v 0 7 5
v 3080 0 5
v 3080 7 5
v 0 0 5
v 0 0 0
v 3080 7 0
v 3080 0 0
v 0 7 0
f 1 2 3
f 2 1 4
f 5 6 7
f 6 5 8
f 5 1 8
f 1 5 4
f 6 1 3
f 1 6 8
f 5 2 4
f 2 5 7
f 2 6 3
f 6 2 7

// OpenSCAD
translate([5.5, 3.5, 2.5]) color([0.6210768456186673, 0.7156193503014563, 0.38801723531250565]) cube([11, 7, 5], center=true);
translate([16.5, 3.5, 2.5]) color([0.4144179882772473, 0.650832862263345, 0.001524221856720187]) cube([11, 7, 5], center=true);
translate([27.5, 3.5, 2.5]) color([0.1923095412446758, 0.3344016906625016, 0.23941596018595857]) cube([11, 7, 5], center=true);
translate([38.5, 3.5, 2.5]) color([0.6373994011293003, 0.37864807032309444, 0.8754233917130172]) cube([11, 7, 5], center=true);
translate([49.5, 3.5, 2.5]) color([0.5681514209101919, 0.4144063966836443, 0.40226707511907955]) cube([11, 7, 5], center=true);
translate([60.5, 3.5, 2.5]) color([0.7018296239336754, 0.41822655329246605, 0.6621958889738174]) cube([11, 7, 5], center=true);
translate([71.5, 3.5, 2.5]) color([0.04677968595679827, 0.44535218971882984, 0.25922692344722276]) cube([11, 7, 5], center=true);
translate([82.5, 3.5, 2.5]) color([0.15768657212231085, 0.5275731301676146, 0.48726560106903205]) cube([11, 7, 5], center=true);
translate([93.5, 3.5, 2.5]) color([0.5614049256144269, 0.7554847672586825, 0.8838751542487009]) cube([11, 7, 5], center=true);
translate([104.5, 3.5, 2.5]) color([0.4945826703752868, 0.31205824641687296, 0.46689223535252355]) cube([11, 7, 5], center=true);
translate([115.5, 3.5, 2.5]) color([0.8090458573603624, 0.8750163314802711, 0.8124149323637591]) cube([11, 7, 5], center=true);
translate([126.5, 3.5, 2.5]) color([0.188001294050828, 0.9994203594553304, 0.6330887599183004]) cube([11, 7, 5], center=true);
translate([137.5, 3.5, 2.5]) color([0.08346705017572931, 0.7255543554613124, 0.9868214802051282]) cube([11, 7, 5], center=true);
translate([148.5, 3.5, 2.5]) color([0.40181682221254356, 0.6785150052419683, 0.31617713722134233]) cube([11, 7, 5], center=true);
translate([159.5, 3.5, 2.5]) color([0.2135246620646961, 0.7173241433110372, 0.0023575647193538884]) cube([11, 7, 5], center=true);
translate([170.5, 3.5, 2.5]) color([0.8227314105314157, 0.5283459768597928, 0.09778434180065931]) cube([11, 7, 5], center=true);
translate([181.5, 3.5, 2.5]) color([0.11890389478474583, 0.6492654248961536, 0.8736538239003423]) cube([11, 7, 5], center=true);
translate([192.5, 3.5, 2.5]) color([0.27998274332687256, 0.9785151867733981, 0.10018068906370903]) cube([11, 7, 5], center=true);
translate([203.5, 3.5, 2.5]) color([0.8539381095973382, 0.39669617733090445, 0.08134541676823415]) cube([11, 7, 5], center=true);
translate([214.5, 3.5, 2.5]) color([0.2747138434192621, 0.4529781848179143, 0.7923415311856522]) cube([11, 7, 5], center=true);
translate([225.5, 3.5, 2.5]) color([0.8613599036372361, 0.13342055420254906, 0.5208655284141989]) cube([11, 7, 5], center=true);
translate([236.5, 3.5, 2.5]) color([0.6507832381497373, 0.3470530145996015, 0.8718638357105861]) cube([11, 7, 5], center=true);
translate([247.5, 3.5, 2.5]) color([0.27840981521636055, 0.01857432754559518, 0.0406632736752609]) cube([11, 7, 5], center=true);
translate([258.5, 3.5, 2.5]) color([0.6809967701112433, 0.5583557360970469, 0.946502554169996]) cube([11, 7, 5], center=true);
translate([269.5, 3.5, 2.5]) color([0.9384387997349186, 0.9098511774051025, 0.04200453196734122]) cube([11, 7, 5], center=true);
translate([280.5, 3.5, 2.5]) color([0.7491348233908631, 0.7013248175948597, 0.6553618646747296]) cube([11, 7, 5], center=true);
translate([291.5, 3.5, 2.5]) color([0.7123576525162417, 0.9027101506193307, 0.6401411997932241]) cube([11, 7, 5], center=true);
translate([302.5, 3.5, 2.5]) color([0.372449262972256, 0.5379287837318205, 0.20784410369082473]) cube([11, 7, 5], center=true);
translate([313.5, 3.5, 2.5]) color([0.5871255046951435, 0.008897082049078797, 0.15102317386398778]) cube([11, 7, 5], center=true);
translate([324.5, 3.5, 2.5]) color([0.3334083880298664, 0.7896231589257826, 0.7184994227715396]) cube([11, 7, 5], center=true);
translate([335.5, 3.5, 2.5]) color([0.3382559700266786, 0.6205381083165517, 0.041202949506209285]) cube([11, 7, 5], center=true);
translate([346.5, 3.5, 2.5]) color([0.16386054567557595, 0.9819140701253054, 0.28953085363586695]) cube([11, 7, 5], center=true);
translate([357.5, 3.5, 2.5]) color([0.39479198298829066, 0.5484842965725134, 0.29340700145733656]) cube([11, 7, 5], center=true);
translate([368.5, 3.5, 2.5]) color([0.47806466915102097, 0.2397060836386239, 0.04825636228829444]) cube([11, 7, 5], center=true);
translate([379.5, 3.5, 2.5]) color([0.17958684904155564, 0.5230502317000981, 0.07086288409434749]) cube([11, 7, 5], center=true);
translate([390.5, 3.5, 2.5]) color([0.4031691464450935, 0.3285207100154869, 0.4147216089714424]) cube([11, 7, 5], center=true);
translate([401.5, 3.5, 2.5]) color([0.09940033823870109, 0.9086575543967805, 0.4740046511372964]) cube([11, 7, 5], center=true);
translate([412.5, 3.5, 2.5]) color([0.8408483326276716, 0.976229457649057, 0.34365159365776776]) cube([11, 7, 5], center=true);
translate([423.5, 3.5, 2.5]) color([0.4790865191519861, 0.6995952911506185, 0.42653532354402823]) cube([11, 7, 5], center=true);
translate([434.5, 3.5, 2.5]) color([0.30190311621935595, 0.7347509912186152, 0.8943997782145745]) cube([11, 7, 5], center=true);
translate([445.5, 3.5, 2.5]) color([0.9196888444316101, 0.6267420468068673, 0.3755713463285453]) cube([11, 7, 5], center=true);
translate([456.5, 3.5, 2.5]) color([0.9745605214796941, 0.6388785175004733, 0.06583467727730097]) cube([11, 7, 5], center=true);
translate([467.5, 3.5, 2.5]) color([0.08466956912011114, 0.749869571783086, 0.06115615654596607]) cube([11, 7, 5], center=true);
translate([478.5, 3.5, 2.5]) color([0.007851005331251826, 0.39380795178170946, 0.5190037287013293]) cube([11, 7, 5], center=true);
translate([489.5, 3.5, 2.5]) color([0.44854428559655457, 0.48861880442715255, 0.5848887019932744]) cube([11, 7, 5], center=true);
translate([500.5, 3.5, 2.5]) color([0.6793025673721249, 0.4230380735074225, 0.3683314563344259]) cube([11, 7, 5], center=true);
translate([511.5, 3.5, 2.5]) color([0.9884590580992895, 0.26091653544625626, 0.7771001545085096]) cube([11, 7, 5], center=true);
translate([522.5, 3.5, 2.5]) color([0.43122102463204415, 0.35852038200953895, 0.06385794894382868]) cube([11, 7, 5], center=true);
translate([533.5, 3.5, 2.5]) color([0.8635789443020424, 0.7020041497619371, 0.9030107075409272]) cube([11, 7, 5], center=true);
translate([544.5, 3.5, 2.5]) color([0.4516117926868677, 0.6769209668166035, 0.11891028655385572]) cube([11, 7, 5], center=true);
translate([555.5, 3.5, 2.5]) color([0.3979536016023134, 0.20723197341708288, 0.04210142789066196]) cube([11, 7, 5], center=true);
translate([566.5, 3.5, 2.5]) color([0.94796135125632, 0.21589436846535714, 0.1463544898080057]) cube([11, 7, 5], center=true);
translate([577.5, 3.5, 2.5]) color([0.19797004355794223, 0.37803196431429753, 0.5463912623151137]) cube([11, 7, 5], center=true);
translate([588.5, 3.5, 2.5]) color([0.15133436847289106, 0.9886898889857565, 0.9829892105452821]) cube([11, 7, 5], center=true);
translate([599.5, 3.5, 2.5]) color([0.14840201708602985, 0.4059068831679489, 0.6799294831100022]) cube([11, 7, 5], center=true);
translate([610.5, 3.5, 2.5]) color([0.8776565829010952, 0.49540592491118873, 0.9170466727598151]) cube([11, 7, 5], center=true);
translate([621.5, 3.5, 2.5]) color([0.3224603148813061, 0.4984408914907503, 0.4986465918650089]) cube([11, 7, 5], center=true);
translate([632.5, 3.5, 2.5]) color([0.6700681513152942, 0.2019913087994536, 0.6097706104167804]) cube([11, 7, 5], center=true);
translate([643.5, 3.5, 2.5]) color([0.21877309687215574, 0.340220315051032, 0.9625664632546818]) cube([11, 7, 5], center=true);
translate([654.5, 3.5, 2.5]) color([0.8990080380310076, 0.8181183809177941, 0.035468261876012264]) cube([11, 7, 5], center=true);
translate([665.5, 3.5, 2.5]) color([0.14836688246192975, 0.2568819120719038, 0.7841665681891542]) cube([11, 7, 5], center=true);
translate([676.5, 3.5, 2.5]) color([0.8423333270773672, 0.5829481802462215, 0.7181316517768294]) cube([11, 7, 5], center=true);
translate([687.5, 3.5, 2.5]) color([0.8070553799750758, 0.06635913103778524, 0.08464313683307012]) cube([11, 7, 5], center=true);
translate([698.5, 3.5, 2.5]) color([0.8688953140043785, 0.03941582937802879, 0.22509065367649606]) cube([11, 7, 5], center=true);
translate([709.5, 3.5, 2.5]) color([0.04063202664590093, 0.015285139969726802, 0.8439546856924078]) cube([11, 7, 5], center=true);
translate([720.5, 3.5, 2.5]) color([0.3305943672500803, 0.1606900602627206, 0.1488194902889095]) cube([11, 7, 5], center=true);
translate([731.5, 3.5, 2.5]) color([0.656083661770337, 0.9685982716927071, 0.5049996926056783]) cube([11, 7, 5], center=true);
translate([742.5, 3.5, 2.5]) color([0.9010904768840049, 0.5024285989524275, 0.5738724774915492]) cube([11, 7, 5], center=true);
translate([753.5, 3.5, 2.5]) color([0.6785713567893591, 0.805109989032137, 0.7578463822613826]) cube([11, 7, 5], center=true);
translate([764.5, 3.5, 2.5]) color([0.9905325627055622, 0.7469653891501328, 0.9057807233528663]) cube([11, 7, 5], center=true);
translate([775.5, 3.5, 2.5]) color([0.20610483206558328, 0.535416304328581, 0.5986142636674691]) cube([11, 7, 5], center=true);
translate([786.5, 3.5, 2.5]) color([0.8256966171603538, 0.4822135630659161, 0.7910402117090956]) cube([11, 7, 5], center=true);
translate([797.5, 3.5, 2.5]) color([0.3885688901501142, 0.5863884555814496, 0.8513166074810679]) cube([11, 7, 5], center=true);
translate([808.5, 3.5, 2.5]) color([0.7980594711041583, 0.6569845518861341, 0.00024069652516689466]) cube([11, 7, 5], center=true);
translate([819.5, 3.5, 2.5]) color([0.18196892218621108, 0.5068577868511277, 0.2544593984833793]) cube([11, 7, 5], center=true);
translate([830.5, 3.5, 2.5]) color([0.06562084327273077, 0.8598834221214616, 0.9429470213131631]) cube([11, 7, 5], center=true);
translate([841.5, 3.5, 2.5]) color([0.3028048781490337, 0.40807316738486077, 0.8100375338172869]) cube([11, 7, 5], center=true);
translate([852.5, 3.5, 2.5]) color([0.06225875887122312, 0.6409848625624502, 0.12732081293278708]) cube([11, 7, 5], center=true);
translate([863.5, 3.5, 2.5]) color([0.2870883399952252, 0.829940686628406, 0.0555270458896614]) cube([11, 7, 5], center=true);
translate([874.5, 3.5, 2.5]) color([0.035933833430188966, 0.4178660447962945, 0.49183095909626395]) cube([11, 7, 5], center=true);
translate([885.5, 3.5, 2.5]) color([0.8633251831082008, 0.7171887463451895, 0.6735438085995347]) cube([11, 7, 5], center=true);
translate([896.5, 3.5, 2.5]) color([0.15137377239978678, 0.9867059242186832, 0.41114019628748133]) cube([11, 7, 5], center=true);
translate([907.5, 3.5, 2.5]) color([0.6117708643248599, 0.38668300553323576, 0.04703291581184044]) cube([11, 7, 5], center=true);
translate([918.5, 3.5, 2.5]) color([0.4708892090480652, 0.15136775389483625, 0.03246546237394399]) cube([11, 7, 5], center=true);
translate([929.5, 3.5, 2.5]) color([0.6174004236810055, 0.6299662912183356, 0.10529282465636491]) cube([11, 7, 5], center=true);
translate([940.5, 3.5, 2.5]) color([0.5491437662317772, 0.3466679766399683, 0.3834140731648874]) cube([11, 7, 5], center=true);
translate([951.5, 3.5, 2.5]) color([0.7764198986996783, 0.49031967752424566, 0.8812766154122413]) cube([11, 7, 5], center=true);
translate([962.5, 3.5, 2.5]) color([0.6101197429062234, 0.4671884150380703, 0.6323126400553846]) cube([11, 7, 5], center=true);
translate([973.5, 3.5, 2.5]) color([0.3378653798287524, 0.12432379252825243, 0.6825296186925238]) cube([11, 7, 5], center=true);
translate([984.5, 3.5, 2.5]) color([0.622037442746657, 0.7885664913738635, 0.1271091249471088]) cube([11, 7, 5], center=true);
translate([995.5, 3.5, 2.5]) color([0.9117833181295222, 0.799341211421814, 0.9168874080910093]) cube([11, 7, 5], center=true);
translate([1006.5, 3.5, 2.5]) color([0.8725347217734669, 0.681006446357057, 0.8102508494373589]) cube([11, 7, 5], center=true);
translate([1017.5, 3.5, 2.5]) color([0.5190073092314018, 0.7854891493606652, 0.18912746785718504]) cube([11, 7, 5], center=true);
translate([1028.5, 3.5, 2.5]) color([0.7821141063572942, 0.44457960405634067, 0.756616221297365]) cube([11, 7, 5], center=true);
translate([1039.5, 3.5, 2.5]) color([0.4554702368121878, 0.7895587282777832, 0.07533958521856021]) cube([11, 7, 5], center=true);
translate([1050.5, 3.5, 2.5]) color([0.04464090542441246, 0.9342895823715677, 0.4861651007487351]) cube([11, 7, 5], center=true);
translate([1061.5, 3.5, 2.5]) color([0.9010713996489047, 0.9447832518820701, 0.6665111524556335]) cube([11, 7, 5], center=true);
translate([1072.5, 3.5, 2.5]) color([0.5717968260934746, 0.21597938410680917, 0.09347621929900818]) cube([11, 7, 5], center=true);
translate([1083.5, 3.5, 2.5]) color([0.8193942150822732, 0.8887720676319878, 0.7793957106948857]) cube([11, 7, 5], center=true);
translate([1094.5, 3.5, 2.5]) color([0.6985024327316249, 0.42011111607482077, 0.3053115900269564]) cube([11, 7, 5], center=true);
translate([1105.5, 3.5, 2.5]) color([0.11344489563770899, 0.425970248072163, 0.5660129742477574]) cube([11, 7, 5], center=true);
translate([1116.5, 3.5, 2.5]) color([0.9228805831375125, 0.9357547693309531, 0.41564119654091314]) cube([11, 7, 5], center=true);
translate([1127.5, 3.5, 2.5]) color([0.0992109880980957, 0.7738187324714434, 0.7342793416571158]) cube([11, 7, 5], center=true);
translate([1138.5, 3.5, 2.5]) color([0.03070084595190614, 0.4467185991338365, 0.6864181042985581]) cube([11, 7, 5], center=true);
translate([1149.5, 3.5, 2.5]) color([0.030134234552269934, 0.9192823534016137, 0.9622424865104192]) cube([11, 7, 5], center=true);
translate([1160.5, 3.5, 2.5]) color([0.72254277208884, 0.0785385396518038, 0.07032946587635569]) cube([11, 7, 5], center=true);
translate([1171.5, 3.5, 2.5]) color([0.3592533148212369, 0.029377507756986443, 0.3478777272843395]) cube([11, 7, 5], center=true);
translate([1182.5, 3.5, 2.5]) color([0.009964241312966027, 0.9743235128409679, 0.8190066990688627]) cube([11, 7, 5], center=true);
translate([1193.5, 3.5, 2.5]) color([0.07051761147818736, 0.8934350918478603, 0.20797804000401565]) cube([11, 7, 5], center=true);
translate([1204.5, 3.5, 2.5]) color([0.20479079826934998, 0.6737591455288341, 0.9382622681625481]) cube([11, 7, 5], center=true);
translate([1215.5, 3.5, 2.5]) color([0.12318812122923739, 0.007184567252270457, 0.3691301471700257]) cube([11, 7, 5], center=true);
translate([1226.5, 3.5, 2.5]) color([0.024650014436155776, 0.6048482375805311, 0.8591756086192088]) cube([11, 7, 5], center=true);
translate([1237.5, 3.5, 2.5]) color([0.1869917024228578, 0.11239103583018406, 0.34444960733861085]) cube([11, 7, 5], center=true);
translate([1248.5, 3.5, 2.5]) color([0.9591715206073138, 0.13015769442868408, 0.9665192604669938]) cube([11, 7, 5], center=true);
translate([1259.5, 3.5, 2.5]) color([0.36223986994484925, 0.47337040276011155, 0.29263198596497353]) cube([11, 7, 5], center=true);
translate([1270.5, 3.5, 2.5]) color([0.9371268442154698, 0.9581478949874975, 0.6359157065077434]) cube([11, 7, 5], center=true);
translate([1281.5, 3.5, 2.5]) color([0.18404555017515556, 0.9929517886102871, 0.10258043954691198]) cube([11, 7, 5], center=true);
translate([1292.5, 3.5, 2.5]) color([0.5808493815940804, 0.15640306008300875, 0.8976753141502056]) cube([11, 7, 5], center=true);
translate([1303.5, 3.5, 2.5]) color([0.9456783914956152, 0.8043902980001079, 0.3158914186681244]) cube([11, 7, 5], center=true);
translate([1314.5, 3.5, 2.5]) color([0.2428386899579852, 0.7548584132190378, 0.291059519145354]) cube([11, 7, 5], center=true);
translate([1325.5, 3.5, 2.5]) color([0.4197853778540753, 0.04625567690264132, 0.13223381043380655]) cube([11, 7, 5], center=true);
translate([1336.5, 3.5, 2.5]) color([0.020549620641776678, 0.0779211200935358, 0.07321114936486084]) cube([11, 7, 5], center=true);
translate([1347.5, 3.5, 2.5]) color([0.42023170217414685, 0.5507771776374378, 0.740878819870922]) cube([11, 7, 5], center=true);
translate([1358.5, 3.5, 2.5]) color([0.14228347384241602, 0.4221887461694188, 0.6369660374117204]) cube([11, 7, 5], center=true);
translate([1369.5, 3.5, 2.5]) color([0.08455569481893255, 0.44481115514620384, 0.3692560392397978]) cube([11, 7, 5], center=true);
translate([1380.5, 3.5, 2.5]) color([0.9489319289416618, 0.05785711390101722, 0.40862622118314806]) cube([11, 7, 5], center=true);
translate([1391.5, 3.5, 2.5]) color([0.41722547979620506, 0.728180504599678, 0.3206710028745039]) cube([11, 7, 5], center=true);
translate([1402.5, 3.5, 2.5]) color([0.20399027594623398, 0.2933116551663051, 0.4708875424493587]) cube([11, 7, 5], center=true);
translate([1413.5, 3.5, 2.5]) color([0.9502683295716211, 0.7965170227633064, 0.2769702457797433]) cube([11, 7, 5], center=true);
translate([1424.5, 3.5, 2.5]) color([0.5581815883930463, 0.6882003035685332, 0.7956571556821322]) cube([11, 7, 5], center=true);
translate([1435.5, 3.5, 2.5]) color([0.4461643839498476, 0.398776905129706, 0.7676407428212785]) cube([11, 7, 5], center=true);
translate([1446.5, 3.5, 2.5]) color([0.43171649556411207, 0.2479576688970051, 0.4534470315306477]) cube([11, 7, 5], center=true);
translate([1457.5, 3.5, 2.5]) color([0.9371046462904561, 0.14256748821860132, 0.4624353545272121]) cube([11, 7, 5], center=true);
translate([1468.5, 3.5, 2.5]) color([0.6373035243637815, 0.48328798826810027, 0.20363990437036994]) cube([11, 7, 5], center=true);
translate([1479.5, 3.5, 2.5]) color([0.0018431606156659175, 0.698991711803439, 0.6187355180234525]) cube([11, 7, 5], center=true);
translate([1490.5, 3.5, 2.5]) color([0.007776649435864202, 0.2985601210181208, 0.7686342595428415]) cube([11, 7, 5], center=true);
translate([1501.5, 3.5, 2.5]) color([0.6289203785446209, 0.5452081159439722, 0.1562211098090489]) cube([11, 7, 5], center=true);
translate([1512.5, 3.5, 2.5]) color([0.7062940429996885, 0.4714349217158037, 0.6781787462359636]) cube([11, 7, 5], center=true);
translate([1523.5, 3.5, 2.5]) color([0.7600898367234922, 0.23236272144124515, 0.7619950130977117]) cube([11, 7, 5], center=true);
translate([1534.5, 3.5, 2.5]) color([0.28008838468838926, 0.9840151371182455, 0.12083161078451865]) cube([11, 7, 5], center=true);
translate([1545.5, 3.5, 2.5]) color([0.8837180187440564, 0.040547125043371324, 0.256575818348144]) cube([11, 7, 5], center=true);
translate([1556.5, 3.5, 2.5]) color([0.5261019087624684, 0.5816161834445946, 0.3962349850280922]) cube([11, 7, 5], center=true);
translate([1567.5, 3.5, 2.5]) color([0.10203172822707107, 0.2526080858247133, 0.28339650386048865]) cube([11, 7, 5], center=true);
translate([1578.5, 3.5, 2.5]) color([0.7552228545587315, 0.9087743252220071, 0.5954099154864194]) cube([11, 7, 5], center=true);
translate([1589.5, 3.5, 2.5]) color([0.03545096569102746, 0.7922364716417103, 0.30560393283991993]) cube([11, 7, 5], center=true);
translate([1600.5, 3.5, 2.5]) color([0.33989040641624346, 0.5301854376454147, 0.24904704757555507]) cube([11, 7, 5], center=true);
translate([1611.5, 3.5, 2.5]) color([0.9199780878573697, 0.1635547583408129, 0.41483040050373277]) cube([11, 7, 5], center=true);
translate([1622.5, 3.5, 2.5]) color([0.2896919495072058, 0.5198341022016146, 0.5739818030823766]) cube([11, 7, 5], center=true);
translate([1633.5, 3.5, 2.5]) color([0.6271396891048426, 0.5313758038379728, 0.4108045023355995]) cube([11, 7, 5], center=true);
translate([1644.5, 3.5, 2.5]) color([0.634594012376466, 0.40341287658681757, 0.7785502590540477]) cube([11, 7, 5], center=true);
translate([1655.5, 3.5, 2.5]) color([0.7881774252549901, 0.29225416811082217, 0.37180432355577453]) cube([11, 7, 5], center=true);
translate([1666.5, 3.5, 2.5]) color([0.6288109059468862, 0.15706996711565713, 0.6970319309869248]) cube([11, 7, 5], center=true);
translate([1677.5, 3.5, 2.5]) color([0.3814277529807131, 0.591062474757007, 0.1395330992312218]) cube([11, 7, 5], center=true);
translate([1688.5, 3.5, 2.5]) color([0.6682583860975598, 0.3540578606136997, 0.4726655762072315]) cube([11, 7, 5], center=true);
translate([1699.5, 3.5, 2.5]) color([0.4151074008495357, 0.47671524799509457, 0.6946956329164442]) cube([11, 7, 5], center=true);
translate([1710.5, 3.5, 2.5]) color([0.31824017683207795, 0.6520544808985483, 0.060222107499701916]) cube([11, 7, 5], center=true);
translate([1721.5, 3.5, 2.5]) color([0.3001851524622099, 0.7452096901500458, 0.05240587806206365]) cube([11, 7, 5], center=true);
translate([1732.5, 3.5, 2.5]) color([0.6211421952822352, 0.025546799267838538, 0.4715288683099005]) cube([11, 7, 5], center=true);
translate([1743.5, 3.5, 2.5]) color([0.8885450437134765, 0.010110093997603875, 0.5268280206539229]) cube([11, 7, 5], center=true);
translate([1754.5, 3.5, 2.5]) color([0.06645682965886301, 0.8671097761494883, 0.6862965222396646]) cube([11, 7, 5], center=true);
translate([1765.5, 3.5, 2.5]) color([0.7419538566814291, 0.669007579945888, 0.006423453698145676]) cube([11, 7, 5], center=true);
translate([1776.5, 3.5, 2.5]) color([0.041177862257898545, 0.6208768040220466, 0.9996851255769114]) cube([11, 7, 5], center=true);
translate([1787.5, 3.5, 2.5]) color([0.8731472390917929, 0.699685806725371, 0.7270999543422898]) cube([11, 7, 5], center=true);
translate([1798.5, 3.5, 2.5]) color([0.2266870226016624, 0.751613934135812, 0.28792410486343756]) cube([11, 7, 5], center=true);
translate([1809.5, 3.5, 2.5]) color([0.10546026702239297, 0.4608948954667579, 0.33019577252961807]) cube([11, 7, 5], center=true);
translate([1820.5, 3.5, 2.5]) color([0.168255398651179, 0.42170989251140467, 0.8972009769638755]) cube([11, 7, 5], center=true);
translate([1831.5, 3.5, 2.5]) color([0.4352702732981688, 0.4472918952497248, 0.708827757444238]) cube([11, 7, 5], center=true);
translate([1842.5, 3.5, 2.5]) color([0.5241618701522923, 0.12922303534199353, 0.91039239754397]) cube([11, 7, 5], center=true);
translate([1853.5, 3.5, 2.5]) color([0.4441243361619651, 0.7893377392253591, 0.38887513002224416]) cube([11, 7, 5], center=true);
translate([1864.5, 3.5, 2.5]) color([0.806846018820692, 0.3895364160074527, 0.2201595216660458]) cube([11, 7, 5], center=true);
translate([1875.5, 3.5, 2.5]) color([0.19619466691666865, 0.9400346443375104, 0.58653025858102]) cube([11, 7, 5], center=true);
translate([1886.5, 3.5, 2.5]) color([0.04979326505826487, 0.38834759617804915, 0.234029260524927]) cube([11, 7, 5], center=true);
translate([1897.5, 3.5, 2.5]) color([0.08465706460929934, 0.18675586852140846, 0.05699047999950346]) cube([11, 7, 5], center=true);
translate([1908.5, 3.5, 2.5]) color([0.6380736282281027, 0.17337386483746886, 0.6107798762435255]) cube([11, 7, 5], center=true);
translate([1919.5, 3.5, 2.5]) color([0.6125067478912297, 0.7049237107399368, 0.5121186506114312]) cube([11, 7, 5], center=true);
translate([1930.5, 3.5, 2.5]) color([0.28442399033479826, 0.8774574539285279, 0.35307108172351365]) cube([11, 7, 5], center=true);
translate([1941.5, 3.5, 2.5]) color([0.4582943249787391, 0.6318794317305464, 0.5161242981674495]) cube([11, 7, 5], center=true);
translate([1952.5, 3.5, 2.5]) color([0.9564683485665337, 0.9547176774381221, 0.9297598506094263]) cube([11, 7, 5], center=true);
translate([1963.5, 3.5, 2.5]) color([0.9340763496652581, 0.580960135568696, 0.49020206373000297]) cube([11, 7, 5], center=true);
translate([1974.5, 3.5, 2.5]) color([0.7041168173823689, 0.21541959298546798, 0.26587203921552827]) cube([11, 7, 5], center=true);
translate([1985.5, 3.5, 2.5]) color([0.04380725363309168, 0.16285754255803098, 0.0038745499388105342]) cube([11, 7, 5], center=true);
translate([1996.5, 3.5, 2.5]) color([0.6546275765234981, 0.14040698903568194, 0.7866793455760521]) cube([11, 7, 5], center=true);
translate([2007.5, 3.5, 2.5]) color([0.680503995881725, 0.9706757933544957, 0.3965144869518913]) cube([11, 7, 5], center=true);
translate([2018.5, 3.5, 2.5]) color([0.9213919134510528, 0.4537041723195332, 0.3395037398362071]) cube([11, 7, 5], center=true);
translate([2029.5, 3.5, 2.5]) color([0.10233886991705377, 0.8828321850718597, 0.7947901585625868]) cube([11, 7, 5], center=true);
translate([2040.5, 3.5, 2.5]) color([0.3229289765350606, 0.45574438492562896, 0.32514346581324827]) cube([11, 7, 5], center=true);
translate([2051.5, 3.5, 2.5]) color([0.028829116538094723, 0.04435252539911694, 0.3687041258820589]) cube([11, 7, 5], center=true);
translate([2062.5, 3.5, 2.5]) color([0.20959132812878367, 0.5245146032105923, 0.1877850356496189]) cube([11, 7, 5], center=true);
translate([2073.5, 3.5, 2.5]) color([0.2016215864664097, 0.6726678813176303, 0.7356026567617159]) cube([11, 7, 5], center=true);
translate([2084.5, 3.5, 2.5]) color([0.31223209587410494, 0.8599943994333726, 0.2546391746557106]) cube([11, 7, 5], center=true);
translate([2095.5, 3.5, 2.5]) color([0.34394037628155716, 0.712480390369609, 0.04450290132920964]) cube([11, 7, 5], center=true);
translate([2106.5, 3.5, 2.5]) color([0.934183460116191, 0.07233773178762537, 0.4609310589380602]) cube([11, 7, 5], center=true);
translate([2117.5, 3.5, 2.5]) color([0.7246048259600892, 0.04746853498479808, 0.8090026856371774]) cube([11, 7, 5], center=true);
translate([2128.5, 3.5, 2.5]) color([0.9788933433114139, 0.460511672795628, 0.11812363628756806]) cube([11, 7, 5], center=true);
translate([2139.5, 3.5, 2.5]) color([0.08147699565547994, 0.09873043616313526, 0.7654413741364753]) cube([11, 7, 5], center=true);
translate([2150.5, 3.5, 2.5]) color([0.4140128484685186, 0.9192341581990311, 0.4406397760864845]) cube([11, 7, 5], center=true);
translate([2161.5, 3.5, 2.5]) color([0.07714331014460807, 0.42693558751800065, 0.7548278934255565]) cube([11, 7, 5], center=true);
translate([2172.5, 3.5, 2.5]) color([0.8293384268467949, 0.039351686529191854, 0.1803893912563338]) cube([11, 7, 5], center=true);
translate([2183.5, 3.5, 2.5]) color([0.490013452023644, 0.12808547795160863, 0.8710926419421733]) cube([11, 7, 5], center=true);
translate([2194.5, 3.5, 2.5]) color([0.9344608884461488, 0.3195969983538176, 0.43484368255202]) cube([11, 7, 5], center=true);
translate([2205.5, 3.5, 2.5]) color([0.5570540644200566, 0.2855057910835891, 0.5410756974595614]) cube([11, 7, 5], center=true);
translate([2216.5, 3.5, 2.5]) color([0.2011850454737838, 0.2966412512769129, 0.44178363318767744]) cube([11, 7, 5], center=true);
translate([2227.5, 3.5, 2.5]) color([0.604669902191143, 0.5361650260862432, 0.2609879767339395]) cube([11, 7, 5], center=true);
translate([2238.5, 3.5, 2.5]) color([0.23178787541805523, 0.11873023670071103, 0.7834936358921726]) cube([11, 7, 5], center=true);
translate([2249.5, 3.5, 2.5]) color([0.09890076646638046, 0.7328850061793606, 0.2487736956630997]) cube([11, 7, 5], center=true);
translate([2260.5, 3.5, 2.5]) color([0.28455698400578255, 0.7360834330107994, 0.6596207917216363]) cube([11, 7, 5], center=true);
translate([2271.5, 3.5, 2.5]) color([0.7419215555155583, 0.5152830587943614, 0.8590958196652707]) cube([11, 7, 5], center=true);
translate([2282.5, 3.5, 2.5]) color([0.12179389137547159, 0.6451969614065052, 0.11824431248865597]) cube([11, 7, 5], center=true);
translate([2293.5, 3.5, 2.5]) color([0.7372833681454282, 0.3589046614584527, 0.67488210437111]) cube([11, 7, 5], center=true);
translate([2304.5, 3.5, 2.5]) color([0.7034839134412817, 0.6606084576410584, 0.22155798032782648]) cube([11, 7, 5], center=true);
translate([2315.5, 3.5, 2.5]) color([0.8317998863873537, 0.24013608742346748, 0.5181532972121122]) cube([11, 7, 5], center=true);
translate([2326.5, 3.5, 2.5]) color([0.6746457541533513, 0.23360317478475656, 0.628511722983939]) cube([11, 7, 5], center=true);
translate([2337.5, 3.5, 2.5]) color([0.2868310479973286, 0.1713823760843869, 0.809748828526577]) cube([11, 7, 5], center=true);
translate([2348.5, 3.5, 2.5]) color([0.5531227700773604, 0.32788470660885605, 0.5854309472055399]) cube([11, 7, 5], center=true);
translate([2359.5, 3.5, 2.5]) color([0.025286397427288332, 0.12982285676032723, 0.3955808516982431]) cube([11, 7, 5], center=true);
translate([2370.5, 3.5, 2.5]) color([0.9757565794644123, 0.5104745178761232, 0.07645620506689521]) cube([11, 7, 5], center=true);
translate([2381.5, 3.5, 2.5]) color([0.7650406152494567, 0.7814438709253152, 0.7748021743948562]) cube([11, 7, 5], center=true);
translate([2392.5, 3.5, 2.5]) color([0.5694980380479538, 0.6956987378694627, 0.21345793631163135]) cube([11, 7, 5], center=true);
translate([2403.5, 3.5, 2.5]) color([0.7325605908939883, 0.8161739873415944, 0.7599665402219192]) cube([11, 7, 5], center=true);
translate([2414.5, 3.5, 2.5]) color([0.353462402585887, 0.5910280505757086, 0.6289893574898388]) cube([11, 7, 5], center=true);
translate([2425.5, 3.5, 2.5]) color([0.9008098536570839, 0.1080138952733335, 0.8339337708504084]) cube([11, 7, 5], center=true);
translate([2436.5, 3.5, 2.5]) color([0.5264355584690392, 0.3586141205519373, 0.4556029014937524]) cube([11, 7, 5], center=true);
translate([2447.5, 3.5, 2.5]) color([0.012635498930738787, 0.22007359233142765, 0.6527634200680049]) cube([11, 7, 5], center=true);
translate([2458.5, 3.5, 2.5]) color([0.660849279754449, 0.4946989402863131, 0.9533258805973196]) cube([11, 7, 5], center=true);
translate([2469.5, 3.5, 2.5]) color([0.4809150885494712, 0.3139436595456605, 0.8477808391956414]) cube([11, 7, 5], center=true);
translate([2480.5, 3.5, 2.5]) color([0.259158299397262, 0.6043059930343495, 0.7034188523223]) cube([11, 7, 5], center=true);
translate([2491.5, 3.5, 2.5]) color([0.8216962986917842, 0.7853687501827489, 0.3840923305137113]) cube([11, 7, 5], center=true);
translate([2502.5, 3.5, 2.5]) color([0.059180305962736934, 0.03828786548344276, 0.7264603879084595]) cube([11, 7, 5], center=true);
translate([2513.5, 3.5, 2.5]) color([0.9616913814068508, 0.3431653742712939, 0.44119509807551416]) cube([11, 7, 5], center=true);
translate([2524.5, 3.5, 2.5]) color([0.7257980157417766, 0.6578312458538799, 0.26010658848413604]) cube([11, 7, 5], center=true);
translate([2535.5, 3.5, 2.5]) color([0.6715848457987025, 0.3049024195743838, 0.3563579065620385]) cube([11, 7, 5], center=true);
translate([2546.5, 3.5, 2.5]) color([0.5395133052630944, 0.7323138239267305, 0.15121621156796483]) cube([11, 7, 5], center=true);
translate([2557.5, 3.5, 2.5]) color([0.021987210892938758, 0.6278299544850219, 0.024564677785836264]) cube([11, 7, 5], center=true);
translate([2568.5, 3.5, 2.5]) color([0.04496324071616853, 0.22577557672213355, 0.6538768733044555]) cube([11, 7, 5], center=true);
translate([2579.5, 3.5, 2.5]) color([0.06654509768602879, 0.06240576762652772, 0.9720932443736168]) cube([11, 7, 5], center=true);
translate([2590.5, 3.5, 2.5]) color([0.4226528937805498, 0.8924289339928592, 0.21652428395276402]) cube([11, 7, 5], center=true);
translate([2601.5, 3.5, 2.5]) color([0.4352131794546169, 0.35803513461315506, 0.17693553603496914]) cube([11, 7, 5], center=true);
translate([2612.5, 3.5, 2.5]) color([0.32881318575191665, 0.9867958186960467, 0.7473090097951195]) cube([11, 7, 5], center=true);
translate([2623.5, 3.5, 2.5]) color([0.3826682791831585, 0.40928443439993156, 0.2637409011550663]) cube([11, 7, 5], center=true);
translate([2634.5, 3.5, 2.5]) color([0.531336678598825, 0.7356369121419466, 0.686646615750601]) cube([11, 7, 5], center=true);
translate([2645.5, 3.5, 2.5]) color([0.46264983534131954, 0.041939046716157, 0.9215078064992686]) cube([11, 7, 5], center=true);
translate([2656.5, 3.5, 2.5]) color([0.4089338030960661, 0.3902988670119316, 0.0031101144891549914]) cube([11, 7, 5], center=true);
translate([2667.5, 3.5, 2.5]) color([0.13822721408191307, 0.8688534175006787, 0.513934596181303]) cube([11, 7, 5], center=true);
translate([2678.5, 3.5, 2.5]) color([0.7324348442226767, 0.14816788643335854, 0.33005100665524945]) cube([11, 7, 5], center=true);
translate([2689.5, 3.5, 2.5]) color([0.8401365565378639, 0.8206585211774247, 0.2467942680862406]) cube([11, 7, 5], center=true);
translate([2700.5, 3.5, 2.5]) color([0.021975308333072263, 0.8064669735456029, 0.16884400503942165]) cube([11, 7, 5], center=true);
translate([2711.5, 3.5, 2.5]) color([0.7876813921208954, 0.6836592298851071, 0.1683147603108942]) cube([11, 7, 5], center=true);
translate([2722.5, 3.5, 2.5]) color([0.0784886436699127, 0.9276494299222889, 0.5978783972833935]) cube([11, 7, 5], center=true);
translate([2733.5, 3.5, 2.5]) color([0.620510173056511, 0.4575118028380537, 0.15007097732228858]) cube([11, 7, 5], center=true);
translate([2744.5, 3.5, 2.5]) color([0.6019699129465877, 0.2524728800375037, 0.8058946560175415]) cube([11, 7, 5], center=true);
translate([2755.5, 3.5, 2.5]) color([0.732718954805416, 0.027267185045511733, 0.9324230096450348]) cube([11, 7, 5], center=true);
translate([2766.5, 3.5, 2.5]) color([0.03631604832667812, 0.0896193188307074, 0.2927345609042453]) cube([11, 7, 5], center=true);
translate([2777.5, 3.5, 2.5]) color([0.1508090604701401, 0.2361450829166024, 0.3558094886115547]) cube([11, 7, 5], center=true);
translate([2788.5, 3.5, 2.5]) color([0.7354997154547138, 0.4047113607648444, 0.2698397547254259]) cube([11, 7, 5], center=true);
translate([2799.5, 3.5, 2.5]) color([0.4923131536276696, 0.39259324978876053, 0.310764197486207]) cube([11, 7, 5], center=true);
translate([2810.5, 3.5, 2.5]) color([0.900541657866744, 0.5504484509596044, 0.9773275109747672]) cube([11, 7, 5], center=true);
translate([2821.5, 3.5, 2.5]) color([0.7729124093934382, 0.570499297619577, 0.26244658927686404]) cube([11, 7, 5], center=true);
translate([2832.5, 3.5, 2.5]) color([0.6868436562888387, 0.45591771896977173, 0.7213877150417534]) cube([11, 7, 5], center=true);
translate([2843.5, 3.5, 2.5]) color([0.40377880891106155, 0.49600503631794757, 0.02068376744575562]) cube([11, 7, 5], center=true);
translate([2854.5, 3.5, 2.5]) color([0.739958502320053, 0.03427354435563068, 0.6807253858476396]) cube([11, 7, 5], center=true);
translate([2865.5, 3.5, 2.5]) color([0.5820036955379622, 0.7759176114881267, 0.28977759923741564]) cube([11, 7, 5], center=true);
translate([2876.5, 3.5, 2.5]) color([0.6861108151233298, 0.20709797563103816, 0.5292720013578311]) cube([11, 7, 5], center=true);
translate([2887.5, 3.5, 2.5]) color([0.34028037925118015, 0.9784545513570129, 0.9718665573793185]) cube([11, 7, 5], center=true);
translate([2898.5, 3.5, 2.5]) color([0.20896973547336006, 0.5660382358858294, 0.3294426858782725]) cube([11, 7, 5], center=true);
translate([2909.5, 3.5, 2.5]) color([0.9685381870202809, 0.9245259481865659, 0.5861458530564896]) cube([11, 7, 5], center=true);
translate([2920.5, 3.5, 2.5]) color([0.7200844551084937, 0.6813247567090696, 0.353355632443361]) cube([11, 7, 5], center=true);
translate([2931.5, 3.5, 2.5]) color([0.91636156937516, 0.899453536816357, 0.33065846447807934]) cube([11, 7, 5], center=true);
translate([2942.5, 3.5, 2.5]) color([0.7473949106043586, 0.009092126674448586, 0.8163591105584419]) cube([11, 7, 5], center=true);
translate([2953.5, 3.5, 2.5]) color([0.5648693453979996, 0.9523067127509502, 0.3631930745481745]) cube([11, 7, 5], center=true);
translate([2964.5, 3.5, 2.5]) color([0.6257130749033707, 0.3230024315033787, 0.7827853814039997]) cube([11, 7, 5], center=true);
translate([2975.5, 3.5, 2.5]) color([0.6007029967830003, 0.9874710229786893, 0.0010127930964535237]) cube([11, 7, 5], center=true);
translate([2986.5, 3.5, 2.5]) color([0.14075874215813544, 0.043601382090813434, 0.1258478488128345]) cube([11, 7, 5], center=true);
translate([2997.5, 3.5, 2.5]) color([0.9293852970698306, 0.9486082995058949, 0.4804125346981437]) cube([11, 7, 5], center=true);
translate([3008.5, 3.5, 2.5]) color([0.9466893945947962, 0.818387610188399, 0.7786177341461099]) cube([11, 7, 5], center=true);
translate([3019.5, 3.5, 2.5]) color([0.747281950803196, 0.18765458516959888, 0.5488772611027803]) cube([11, 7, 5], center=true);
translate([3030.5, 3.5, 2.5]) color([0.4238792306088448, 0.949788047597888, 0.17383353806681645]) cube([11, 7, 5], center=true);
translate([3041.5, 3.5, 2.5]) color([0.16985884355967462, 0.6588617536380149, 0.15740178957348283]) cube([11, 7, 5], center=true);
translate([3052.5, 3.5, 2.5]) color([0.11005367295186075, 0.5039231973300066, 0.796660971220008]) cube([11, 7, 5], center=true);
translate([3063.5, 3.5, 2.5]) color([0.6050456716470326, 0.7547539728480395, 0.2657585316255522]) cube([11, 7, 5], center=true);
translate([3074.5, 3.5, 2.5]) color([0.28496283302929337, 0.42870364173152453, 0.990847884265713]) cube([11, 7, 5], center=true);
